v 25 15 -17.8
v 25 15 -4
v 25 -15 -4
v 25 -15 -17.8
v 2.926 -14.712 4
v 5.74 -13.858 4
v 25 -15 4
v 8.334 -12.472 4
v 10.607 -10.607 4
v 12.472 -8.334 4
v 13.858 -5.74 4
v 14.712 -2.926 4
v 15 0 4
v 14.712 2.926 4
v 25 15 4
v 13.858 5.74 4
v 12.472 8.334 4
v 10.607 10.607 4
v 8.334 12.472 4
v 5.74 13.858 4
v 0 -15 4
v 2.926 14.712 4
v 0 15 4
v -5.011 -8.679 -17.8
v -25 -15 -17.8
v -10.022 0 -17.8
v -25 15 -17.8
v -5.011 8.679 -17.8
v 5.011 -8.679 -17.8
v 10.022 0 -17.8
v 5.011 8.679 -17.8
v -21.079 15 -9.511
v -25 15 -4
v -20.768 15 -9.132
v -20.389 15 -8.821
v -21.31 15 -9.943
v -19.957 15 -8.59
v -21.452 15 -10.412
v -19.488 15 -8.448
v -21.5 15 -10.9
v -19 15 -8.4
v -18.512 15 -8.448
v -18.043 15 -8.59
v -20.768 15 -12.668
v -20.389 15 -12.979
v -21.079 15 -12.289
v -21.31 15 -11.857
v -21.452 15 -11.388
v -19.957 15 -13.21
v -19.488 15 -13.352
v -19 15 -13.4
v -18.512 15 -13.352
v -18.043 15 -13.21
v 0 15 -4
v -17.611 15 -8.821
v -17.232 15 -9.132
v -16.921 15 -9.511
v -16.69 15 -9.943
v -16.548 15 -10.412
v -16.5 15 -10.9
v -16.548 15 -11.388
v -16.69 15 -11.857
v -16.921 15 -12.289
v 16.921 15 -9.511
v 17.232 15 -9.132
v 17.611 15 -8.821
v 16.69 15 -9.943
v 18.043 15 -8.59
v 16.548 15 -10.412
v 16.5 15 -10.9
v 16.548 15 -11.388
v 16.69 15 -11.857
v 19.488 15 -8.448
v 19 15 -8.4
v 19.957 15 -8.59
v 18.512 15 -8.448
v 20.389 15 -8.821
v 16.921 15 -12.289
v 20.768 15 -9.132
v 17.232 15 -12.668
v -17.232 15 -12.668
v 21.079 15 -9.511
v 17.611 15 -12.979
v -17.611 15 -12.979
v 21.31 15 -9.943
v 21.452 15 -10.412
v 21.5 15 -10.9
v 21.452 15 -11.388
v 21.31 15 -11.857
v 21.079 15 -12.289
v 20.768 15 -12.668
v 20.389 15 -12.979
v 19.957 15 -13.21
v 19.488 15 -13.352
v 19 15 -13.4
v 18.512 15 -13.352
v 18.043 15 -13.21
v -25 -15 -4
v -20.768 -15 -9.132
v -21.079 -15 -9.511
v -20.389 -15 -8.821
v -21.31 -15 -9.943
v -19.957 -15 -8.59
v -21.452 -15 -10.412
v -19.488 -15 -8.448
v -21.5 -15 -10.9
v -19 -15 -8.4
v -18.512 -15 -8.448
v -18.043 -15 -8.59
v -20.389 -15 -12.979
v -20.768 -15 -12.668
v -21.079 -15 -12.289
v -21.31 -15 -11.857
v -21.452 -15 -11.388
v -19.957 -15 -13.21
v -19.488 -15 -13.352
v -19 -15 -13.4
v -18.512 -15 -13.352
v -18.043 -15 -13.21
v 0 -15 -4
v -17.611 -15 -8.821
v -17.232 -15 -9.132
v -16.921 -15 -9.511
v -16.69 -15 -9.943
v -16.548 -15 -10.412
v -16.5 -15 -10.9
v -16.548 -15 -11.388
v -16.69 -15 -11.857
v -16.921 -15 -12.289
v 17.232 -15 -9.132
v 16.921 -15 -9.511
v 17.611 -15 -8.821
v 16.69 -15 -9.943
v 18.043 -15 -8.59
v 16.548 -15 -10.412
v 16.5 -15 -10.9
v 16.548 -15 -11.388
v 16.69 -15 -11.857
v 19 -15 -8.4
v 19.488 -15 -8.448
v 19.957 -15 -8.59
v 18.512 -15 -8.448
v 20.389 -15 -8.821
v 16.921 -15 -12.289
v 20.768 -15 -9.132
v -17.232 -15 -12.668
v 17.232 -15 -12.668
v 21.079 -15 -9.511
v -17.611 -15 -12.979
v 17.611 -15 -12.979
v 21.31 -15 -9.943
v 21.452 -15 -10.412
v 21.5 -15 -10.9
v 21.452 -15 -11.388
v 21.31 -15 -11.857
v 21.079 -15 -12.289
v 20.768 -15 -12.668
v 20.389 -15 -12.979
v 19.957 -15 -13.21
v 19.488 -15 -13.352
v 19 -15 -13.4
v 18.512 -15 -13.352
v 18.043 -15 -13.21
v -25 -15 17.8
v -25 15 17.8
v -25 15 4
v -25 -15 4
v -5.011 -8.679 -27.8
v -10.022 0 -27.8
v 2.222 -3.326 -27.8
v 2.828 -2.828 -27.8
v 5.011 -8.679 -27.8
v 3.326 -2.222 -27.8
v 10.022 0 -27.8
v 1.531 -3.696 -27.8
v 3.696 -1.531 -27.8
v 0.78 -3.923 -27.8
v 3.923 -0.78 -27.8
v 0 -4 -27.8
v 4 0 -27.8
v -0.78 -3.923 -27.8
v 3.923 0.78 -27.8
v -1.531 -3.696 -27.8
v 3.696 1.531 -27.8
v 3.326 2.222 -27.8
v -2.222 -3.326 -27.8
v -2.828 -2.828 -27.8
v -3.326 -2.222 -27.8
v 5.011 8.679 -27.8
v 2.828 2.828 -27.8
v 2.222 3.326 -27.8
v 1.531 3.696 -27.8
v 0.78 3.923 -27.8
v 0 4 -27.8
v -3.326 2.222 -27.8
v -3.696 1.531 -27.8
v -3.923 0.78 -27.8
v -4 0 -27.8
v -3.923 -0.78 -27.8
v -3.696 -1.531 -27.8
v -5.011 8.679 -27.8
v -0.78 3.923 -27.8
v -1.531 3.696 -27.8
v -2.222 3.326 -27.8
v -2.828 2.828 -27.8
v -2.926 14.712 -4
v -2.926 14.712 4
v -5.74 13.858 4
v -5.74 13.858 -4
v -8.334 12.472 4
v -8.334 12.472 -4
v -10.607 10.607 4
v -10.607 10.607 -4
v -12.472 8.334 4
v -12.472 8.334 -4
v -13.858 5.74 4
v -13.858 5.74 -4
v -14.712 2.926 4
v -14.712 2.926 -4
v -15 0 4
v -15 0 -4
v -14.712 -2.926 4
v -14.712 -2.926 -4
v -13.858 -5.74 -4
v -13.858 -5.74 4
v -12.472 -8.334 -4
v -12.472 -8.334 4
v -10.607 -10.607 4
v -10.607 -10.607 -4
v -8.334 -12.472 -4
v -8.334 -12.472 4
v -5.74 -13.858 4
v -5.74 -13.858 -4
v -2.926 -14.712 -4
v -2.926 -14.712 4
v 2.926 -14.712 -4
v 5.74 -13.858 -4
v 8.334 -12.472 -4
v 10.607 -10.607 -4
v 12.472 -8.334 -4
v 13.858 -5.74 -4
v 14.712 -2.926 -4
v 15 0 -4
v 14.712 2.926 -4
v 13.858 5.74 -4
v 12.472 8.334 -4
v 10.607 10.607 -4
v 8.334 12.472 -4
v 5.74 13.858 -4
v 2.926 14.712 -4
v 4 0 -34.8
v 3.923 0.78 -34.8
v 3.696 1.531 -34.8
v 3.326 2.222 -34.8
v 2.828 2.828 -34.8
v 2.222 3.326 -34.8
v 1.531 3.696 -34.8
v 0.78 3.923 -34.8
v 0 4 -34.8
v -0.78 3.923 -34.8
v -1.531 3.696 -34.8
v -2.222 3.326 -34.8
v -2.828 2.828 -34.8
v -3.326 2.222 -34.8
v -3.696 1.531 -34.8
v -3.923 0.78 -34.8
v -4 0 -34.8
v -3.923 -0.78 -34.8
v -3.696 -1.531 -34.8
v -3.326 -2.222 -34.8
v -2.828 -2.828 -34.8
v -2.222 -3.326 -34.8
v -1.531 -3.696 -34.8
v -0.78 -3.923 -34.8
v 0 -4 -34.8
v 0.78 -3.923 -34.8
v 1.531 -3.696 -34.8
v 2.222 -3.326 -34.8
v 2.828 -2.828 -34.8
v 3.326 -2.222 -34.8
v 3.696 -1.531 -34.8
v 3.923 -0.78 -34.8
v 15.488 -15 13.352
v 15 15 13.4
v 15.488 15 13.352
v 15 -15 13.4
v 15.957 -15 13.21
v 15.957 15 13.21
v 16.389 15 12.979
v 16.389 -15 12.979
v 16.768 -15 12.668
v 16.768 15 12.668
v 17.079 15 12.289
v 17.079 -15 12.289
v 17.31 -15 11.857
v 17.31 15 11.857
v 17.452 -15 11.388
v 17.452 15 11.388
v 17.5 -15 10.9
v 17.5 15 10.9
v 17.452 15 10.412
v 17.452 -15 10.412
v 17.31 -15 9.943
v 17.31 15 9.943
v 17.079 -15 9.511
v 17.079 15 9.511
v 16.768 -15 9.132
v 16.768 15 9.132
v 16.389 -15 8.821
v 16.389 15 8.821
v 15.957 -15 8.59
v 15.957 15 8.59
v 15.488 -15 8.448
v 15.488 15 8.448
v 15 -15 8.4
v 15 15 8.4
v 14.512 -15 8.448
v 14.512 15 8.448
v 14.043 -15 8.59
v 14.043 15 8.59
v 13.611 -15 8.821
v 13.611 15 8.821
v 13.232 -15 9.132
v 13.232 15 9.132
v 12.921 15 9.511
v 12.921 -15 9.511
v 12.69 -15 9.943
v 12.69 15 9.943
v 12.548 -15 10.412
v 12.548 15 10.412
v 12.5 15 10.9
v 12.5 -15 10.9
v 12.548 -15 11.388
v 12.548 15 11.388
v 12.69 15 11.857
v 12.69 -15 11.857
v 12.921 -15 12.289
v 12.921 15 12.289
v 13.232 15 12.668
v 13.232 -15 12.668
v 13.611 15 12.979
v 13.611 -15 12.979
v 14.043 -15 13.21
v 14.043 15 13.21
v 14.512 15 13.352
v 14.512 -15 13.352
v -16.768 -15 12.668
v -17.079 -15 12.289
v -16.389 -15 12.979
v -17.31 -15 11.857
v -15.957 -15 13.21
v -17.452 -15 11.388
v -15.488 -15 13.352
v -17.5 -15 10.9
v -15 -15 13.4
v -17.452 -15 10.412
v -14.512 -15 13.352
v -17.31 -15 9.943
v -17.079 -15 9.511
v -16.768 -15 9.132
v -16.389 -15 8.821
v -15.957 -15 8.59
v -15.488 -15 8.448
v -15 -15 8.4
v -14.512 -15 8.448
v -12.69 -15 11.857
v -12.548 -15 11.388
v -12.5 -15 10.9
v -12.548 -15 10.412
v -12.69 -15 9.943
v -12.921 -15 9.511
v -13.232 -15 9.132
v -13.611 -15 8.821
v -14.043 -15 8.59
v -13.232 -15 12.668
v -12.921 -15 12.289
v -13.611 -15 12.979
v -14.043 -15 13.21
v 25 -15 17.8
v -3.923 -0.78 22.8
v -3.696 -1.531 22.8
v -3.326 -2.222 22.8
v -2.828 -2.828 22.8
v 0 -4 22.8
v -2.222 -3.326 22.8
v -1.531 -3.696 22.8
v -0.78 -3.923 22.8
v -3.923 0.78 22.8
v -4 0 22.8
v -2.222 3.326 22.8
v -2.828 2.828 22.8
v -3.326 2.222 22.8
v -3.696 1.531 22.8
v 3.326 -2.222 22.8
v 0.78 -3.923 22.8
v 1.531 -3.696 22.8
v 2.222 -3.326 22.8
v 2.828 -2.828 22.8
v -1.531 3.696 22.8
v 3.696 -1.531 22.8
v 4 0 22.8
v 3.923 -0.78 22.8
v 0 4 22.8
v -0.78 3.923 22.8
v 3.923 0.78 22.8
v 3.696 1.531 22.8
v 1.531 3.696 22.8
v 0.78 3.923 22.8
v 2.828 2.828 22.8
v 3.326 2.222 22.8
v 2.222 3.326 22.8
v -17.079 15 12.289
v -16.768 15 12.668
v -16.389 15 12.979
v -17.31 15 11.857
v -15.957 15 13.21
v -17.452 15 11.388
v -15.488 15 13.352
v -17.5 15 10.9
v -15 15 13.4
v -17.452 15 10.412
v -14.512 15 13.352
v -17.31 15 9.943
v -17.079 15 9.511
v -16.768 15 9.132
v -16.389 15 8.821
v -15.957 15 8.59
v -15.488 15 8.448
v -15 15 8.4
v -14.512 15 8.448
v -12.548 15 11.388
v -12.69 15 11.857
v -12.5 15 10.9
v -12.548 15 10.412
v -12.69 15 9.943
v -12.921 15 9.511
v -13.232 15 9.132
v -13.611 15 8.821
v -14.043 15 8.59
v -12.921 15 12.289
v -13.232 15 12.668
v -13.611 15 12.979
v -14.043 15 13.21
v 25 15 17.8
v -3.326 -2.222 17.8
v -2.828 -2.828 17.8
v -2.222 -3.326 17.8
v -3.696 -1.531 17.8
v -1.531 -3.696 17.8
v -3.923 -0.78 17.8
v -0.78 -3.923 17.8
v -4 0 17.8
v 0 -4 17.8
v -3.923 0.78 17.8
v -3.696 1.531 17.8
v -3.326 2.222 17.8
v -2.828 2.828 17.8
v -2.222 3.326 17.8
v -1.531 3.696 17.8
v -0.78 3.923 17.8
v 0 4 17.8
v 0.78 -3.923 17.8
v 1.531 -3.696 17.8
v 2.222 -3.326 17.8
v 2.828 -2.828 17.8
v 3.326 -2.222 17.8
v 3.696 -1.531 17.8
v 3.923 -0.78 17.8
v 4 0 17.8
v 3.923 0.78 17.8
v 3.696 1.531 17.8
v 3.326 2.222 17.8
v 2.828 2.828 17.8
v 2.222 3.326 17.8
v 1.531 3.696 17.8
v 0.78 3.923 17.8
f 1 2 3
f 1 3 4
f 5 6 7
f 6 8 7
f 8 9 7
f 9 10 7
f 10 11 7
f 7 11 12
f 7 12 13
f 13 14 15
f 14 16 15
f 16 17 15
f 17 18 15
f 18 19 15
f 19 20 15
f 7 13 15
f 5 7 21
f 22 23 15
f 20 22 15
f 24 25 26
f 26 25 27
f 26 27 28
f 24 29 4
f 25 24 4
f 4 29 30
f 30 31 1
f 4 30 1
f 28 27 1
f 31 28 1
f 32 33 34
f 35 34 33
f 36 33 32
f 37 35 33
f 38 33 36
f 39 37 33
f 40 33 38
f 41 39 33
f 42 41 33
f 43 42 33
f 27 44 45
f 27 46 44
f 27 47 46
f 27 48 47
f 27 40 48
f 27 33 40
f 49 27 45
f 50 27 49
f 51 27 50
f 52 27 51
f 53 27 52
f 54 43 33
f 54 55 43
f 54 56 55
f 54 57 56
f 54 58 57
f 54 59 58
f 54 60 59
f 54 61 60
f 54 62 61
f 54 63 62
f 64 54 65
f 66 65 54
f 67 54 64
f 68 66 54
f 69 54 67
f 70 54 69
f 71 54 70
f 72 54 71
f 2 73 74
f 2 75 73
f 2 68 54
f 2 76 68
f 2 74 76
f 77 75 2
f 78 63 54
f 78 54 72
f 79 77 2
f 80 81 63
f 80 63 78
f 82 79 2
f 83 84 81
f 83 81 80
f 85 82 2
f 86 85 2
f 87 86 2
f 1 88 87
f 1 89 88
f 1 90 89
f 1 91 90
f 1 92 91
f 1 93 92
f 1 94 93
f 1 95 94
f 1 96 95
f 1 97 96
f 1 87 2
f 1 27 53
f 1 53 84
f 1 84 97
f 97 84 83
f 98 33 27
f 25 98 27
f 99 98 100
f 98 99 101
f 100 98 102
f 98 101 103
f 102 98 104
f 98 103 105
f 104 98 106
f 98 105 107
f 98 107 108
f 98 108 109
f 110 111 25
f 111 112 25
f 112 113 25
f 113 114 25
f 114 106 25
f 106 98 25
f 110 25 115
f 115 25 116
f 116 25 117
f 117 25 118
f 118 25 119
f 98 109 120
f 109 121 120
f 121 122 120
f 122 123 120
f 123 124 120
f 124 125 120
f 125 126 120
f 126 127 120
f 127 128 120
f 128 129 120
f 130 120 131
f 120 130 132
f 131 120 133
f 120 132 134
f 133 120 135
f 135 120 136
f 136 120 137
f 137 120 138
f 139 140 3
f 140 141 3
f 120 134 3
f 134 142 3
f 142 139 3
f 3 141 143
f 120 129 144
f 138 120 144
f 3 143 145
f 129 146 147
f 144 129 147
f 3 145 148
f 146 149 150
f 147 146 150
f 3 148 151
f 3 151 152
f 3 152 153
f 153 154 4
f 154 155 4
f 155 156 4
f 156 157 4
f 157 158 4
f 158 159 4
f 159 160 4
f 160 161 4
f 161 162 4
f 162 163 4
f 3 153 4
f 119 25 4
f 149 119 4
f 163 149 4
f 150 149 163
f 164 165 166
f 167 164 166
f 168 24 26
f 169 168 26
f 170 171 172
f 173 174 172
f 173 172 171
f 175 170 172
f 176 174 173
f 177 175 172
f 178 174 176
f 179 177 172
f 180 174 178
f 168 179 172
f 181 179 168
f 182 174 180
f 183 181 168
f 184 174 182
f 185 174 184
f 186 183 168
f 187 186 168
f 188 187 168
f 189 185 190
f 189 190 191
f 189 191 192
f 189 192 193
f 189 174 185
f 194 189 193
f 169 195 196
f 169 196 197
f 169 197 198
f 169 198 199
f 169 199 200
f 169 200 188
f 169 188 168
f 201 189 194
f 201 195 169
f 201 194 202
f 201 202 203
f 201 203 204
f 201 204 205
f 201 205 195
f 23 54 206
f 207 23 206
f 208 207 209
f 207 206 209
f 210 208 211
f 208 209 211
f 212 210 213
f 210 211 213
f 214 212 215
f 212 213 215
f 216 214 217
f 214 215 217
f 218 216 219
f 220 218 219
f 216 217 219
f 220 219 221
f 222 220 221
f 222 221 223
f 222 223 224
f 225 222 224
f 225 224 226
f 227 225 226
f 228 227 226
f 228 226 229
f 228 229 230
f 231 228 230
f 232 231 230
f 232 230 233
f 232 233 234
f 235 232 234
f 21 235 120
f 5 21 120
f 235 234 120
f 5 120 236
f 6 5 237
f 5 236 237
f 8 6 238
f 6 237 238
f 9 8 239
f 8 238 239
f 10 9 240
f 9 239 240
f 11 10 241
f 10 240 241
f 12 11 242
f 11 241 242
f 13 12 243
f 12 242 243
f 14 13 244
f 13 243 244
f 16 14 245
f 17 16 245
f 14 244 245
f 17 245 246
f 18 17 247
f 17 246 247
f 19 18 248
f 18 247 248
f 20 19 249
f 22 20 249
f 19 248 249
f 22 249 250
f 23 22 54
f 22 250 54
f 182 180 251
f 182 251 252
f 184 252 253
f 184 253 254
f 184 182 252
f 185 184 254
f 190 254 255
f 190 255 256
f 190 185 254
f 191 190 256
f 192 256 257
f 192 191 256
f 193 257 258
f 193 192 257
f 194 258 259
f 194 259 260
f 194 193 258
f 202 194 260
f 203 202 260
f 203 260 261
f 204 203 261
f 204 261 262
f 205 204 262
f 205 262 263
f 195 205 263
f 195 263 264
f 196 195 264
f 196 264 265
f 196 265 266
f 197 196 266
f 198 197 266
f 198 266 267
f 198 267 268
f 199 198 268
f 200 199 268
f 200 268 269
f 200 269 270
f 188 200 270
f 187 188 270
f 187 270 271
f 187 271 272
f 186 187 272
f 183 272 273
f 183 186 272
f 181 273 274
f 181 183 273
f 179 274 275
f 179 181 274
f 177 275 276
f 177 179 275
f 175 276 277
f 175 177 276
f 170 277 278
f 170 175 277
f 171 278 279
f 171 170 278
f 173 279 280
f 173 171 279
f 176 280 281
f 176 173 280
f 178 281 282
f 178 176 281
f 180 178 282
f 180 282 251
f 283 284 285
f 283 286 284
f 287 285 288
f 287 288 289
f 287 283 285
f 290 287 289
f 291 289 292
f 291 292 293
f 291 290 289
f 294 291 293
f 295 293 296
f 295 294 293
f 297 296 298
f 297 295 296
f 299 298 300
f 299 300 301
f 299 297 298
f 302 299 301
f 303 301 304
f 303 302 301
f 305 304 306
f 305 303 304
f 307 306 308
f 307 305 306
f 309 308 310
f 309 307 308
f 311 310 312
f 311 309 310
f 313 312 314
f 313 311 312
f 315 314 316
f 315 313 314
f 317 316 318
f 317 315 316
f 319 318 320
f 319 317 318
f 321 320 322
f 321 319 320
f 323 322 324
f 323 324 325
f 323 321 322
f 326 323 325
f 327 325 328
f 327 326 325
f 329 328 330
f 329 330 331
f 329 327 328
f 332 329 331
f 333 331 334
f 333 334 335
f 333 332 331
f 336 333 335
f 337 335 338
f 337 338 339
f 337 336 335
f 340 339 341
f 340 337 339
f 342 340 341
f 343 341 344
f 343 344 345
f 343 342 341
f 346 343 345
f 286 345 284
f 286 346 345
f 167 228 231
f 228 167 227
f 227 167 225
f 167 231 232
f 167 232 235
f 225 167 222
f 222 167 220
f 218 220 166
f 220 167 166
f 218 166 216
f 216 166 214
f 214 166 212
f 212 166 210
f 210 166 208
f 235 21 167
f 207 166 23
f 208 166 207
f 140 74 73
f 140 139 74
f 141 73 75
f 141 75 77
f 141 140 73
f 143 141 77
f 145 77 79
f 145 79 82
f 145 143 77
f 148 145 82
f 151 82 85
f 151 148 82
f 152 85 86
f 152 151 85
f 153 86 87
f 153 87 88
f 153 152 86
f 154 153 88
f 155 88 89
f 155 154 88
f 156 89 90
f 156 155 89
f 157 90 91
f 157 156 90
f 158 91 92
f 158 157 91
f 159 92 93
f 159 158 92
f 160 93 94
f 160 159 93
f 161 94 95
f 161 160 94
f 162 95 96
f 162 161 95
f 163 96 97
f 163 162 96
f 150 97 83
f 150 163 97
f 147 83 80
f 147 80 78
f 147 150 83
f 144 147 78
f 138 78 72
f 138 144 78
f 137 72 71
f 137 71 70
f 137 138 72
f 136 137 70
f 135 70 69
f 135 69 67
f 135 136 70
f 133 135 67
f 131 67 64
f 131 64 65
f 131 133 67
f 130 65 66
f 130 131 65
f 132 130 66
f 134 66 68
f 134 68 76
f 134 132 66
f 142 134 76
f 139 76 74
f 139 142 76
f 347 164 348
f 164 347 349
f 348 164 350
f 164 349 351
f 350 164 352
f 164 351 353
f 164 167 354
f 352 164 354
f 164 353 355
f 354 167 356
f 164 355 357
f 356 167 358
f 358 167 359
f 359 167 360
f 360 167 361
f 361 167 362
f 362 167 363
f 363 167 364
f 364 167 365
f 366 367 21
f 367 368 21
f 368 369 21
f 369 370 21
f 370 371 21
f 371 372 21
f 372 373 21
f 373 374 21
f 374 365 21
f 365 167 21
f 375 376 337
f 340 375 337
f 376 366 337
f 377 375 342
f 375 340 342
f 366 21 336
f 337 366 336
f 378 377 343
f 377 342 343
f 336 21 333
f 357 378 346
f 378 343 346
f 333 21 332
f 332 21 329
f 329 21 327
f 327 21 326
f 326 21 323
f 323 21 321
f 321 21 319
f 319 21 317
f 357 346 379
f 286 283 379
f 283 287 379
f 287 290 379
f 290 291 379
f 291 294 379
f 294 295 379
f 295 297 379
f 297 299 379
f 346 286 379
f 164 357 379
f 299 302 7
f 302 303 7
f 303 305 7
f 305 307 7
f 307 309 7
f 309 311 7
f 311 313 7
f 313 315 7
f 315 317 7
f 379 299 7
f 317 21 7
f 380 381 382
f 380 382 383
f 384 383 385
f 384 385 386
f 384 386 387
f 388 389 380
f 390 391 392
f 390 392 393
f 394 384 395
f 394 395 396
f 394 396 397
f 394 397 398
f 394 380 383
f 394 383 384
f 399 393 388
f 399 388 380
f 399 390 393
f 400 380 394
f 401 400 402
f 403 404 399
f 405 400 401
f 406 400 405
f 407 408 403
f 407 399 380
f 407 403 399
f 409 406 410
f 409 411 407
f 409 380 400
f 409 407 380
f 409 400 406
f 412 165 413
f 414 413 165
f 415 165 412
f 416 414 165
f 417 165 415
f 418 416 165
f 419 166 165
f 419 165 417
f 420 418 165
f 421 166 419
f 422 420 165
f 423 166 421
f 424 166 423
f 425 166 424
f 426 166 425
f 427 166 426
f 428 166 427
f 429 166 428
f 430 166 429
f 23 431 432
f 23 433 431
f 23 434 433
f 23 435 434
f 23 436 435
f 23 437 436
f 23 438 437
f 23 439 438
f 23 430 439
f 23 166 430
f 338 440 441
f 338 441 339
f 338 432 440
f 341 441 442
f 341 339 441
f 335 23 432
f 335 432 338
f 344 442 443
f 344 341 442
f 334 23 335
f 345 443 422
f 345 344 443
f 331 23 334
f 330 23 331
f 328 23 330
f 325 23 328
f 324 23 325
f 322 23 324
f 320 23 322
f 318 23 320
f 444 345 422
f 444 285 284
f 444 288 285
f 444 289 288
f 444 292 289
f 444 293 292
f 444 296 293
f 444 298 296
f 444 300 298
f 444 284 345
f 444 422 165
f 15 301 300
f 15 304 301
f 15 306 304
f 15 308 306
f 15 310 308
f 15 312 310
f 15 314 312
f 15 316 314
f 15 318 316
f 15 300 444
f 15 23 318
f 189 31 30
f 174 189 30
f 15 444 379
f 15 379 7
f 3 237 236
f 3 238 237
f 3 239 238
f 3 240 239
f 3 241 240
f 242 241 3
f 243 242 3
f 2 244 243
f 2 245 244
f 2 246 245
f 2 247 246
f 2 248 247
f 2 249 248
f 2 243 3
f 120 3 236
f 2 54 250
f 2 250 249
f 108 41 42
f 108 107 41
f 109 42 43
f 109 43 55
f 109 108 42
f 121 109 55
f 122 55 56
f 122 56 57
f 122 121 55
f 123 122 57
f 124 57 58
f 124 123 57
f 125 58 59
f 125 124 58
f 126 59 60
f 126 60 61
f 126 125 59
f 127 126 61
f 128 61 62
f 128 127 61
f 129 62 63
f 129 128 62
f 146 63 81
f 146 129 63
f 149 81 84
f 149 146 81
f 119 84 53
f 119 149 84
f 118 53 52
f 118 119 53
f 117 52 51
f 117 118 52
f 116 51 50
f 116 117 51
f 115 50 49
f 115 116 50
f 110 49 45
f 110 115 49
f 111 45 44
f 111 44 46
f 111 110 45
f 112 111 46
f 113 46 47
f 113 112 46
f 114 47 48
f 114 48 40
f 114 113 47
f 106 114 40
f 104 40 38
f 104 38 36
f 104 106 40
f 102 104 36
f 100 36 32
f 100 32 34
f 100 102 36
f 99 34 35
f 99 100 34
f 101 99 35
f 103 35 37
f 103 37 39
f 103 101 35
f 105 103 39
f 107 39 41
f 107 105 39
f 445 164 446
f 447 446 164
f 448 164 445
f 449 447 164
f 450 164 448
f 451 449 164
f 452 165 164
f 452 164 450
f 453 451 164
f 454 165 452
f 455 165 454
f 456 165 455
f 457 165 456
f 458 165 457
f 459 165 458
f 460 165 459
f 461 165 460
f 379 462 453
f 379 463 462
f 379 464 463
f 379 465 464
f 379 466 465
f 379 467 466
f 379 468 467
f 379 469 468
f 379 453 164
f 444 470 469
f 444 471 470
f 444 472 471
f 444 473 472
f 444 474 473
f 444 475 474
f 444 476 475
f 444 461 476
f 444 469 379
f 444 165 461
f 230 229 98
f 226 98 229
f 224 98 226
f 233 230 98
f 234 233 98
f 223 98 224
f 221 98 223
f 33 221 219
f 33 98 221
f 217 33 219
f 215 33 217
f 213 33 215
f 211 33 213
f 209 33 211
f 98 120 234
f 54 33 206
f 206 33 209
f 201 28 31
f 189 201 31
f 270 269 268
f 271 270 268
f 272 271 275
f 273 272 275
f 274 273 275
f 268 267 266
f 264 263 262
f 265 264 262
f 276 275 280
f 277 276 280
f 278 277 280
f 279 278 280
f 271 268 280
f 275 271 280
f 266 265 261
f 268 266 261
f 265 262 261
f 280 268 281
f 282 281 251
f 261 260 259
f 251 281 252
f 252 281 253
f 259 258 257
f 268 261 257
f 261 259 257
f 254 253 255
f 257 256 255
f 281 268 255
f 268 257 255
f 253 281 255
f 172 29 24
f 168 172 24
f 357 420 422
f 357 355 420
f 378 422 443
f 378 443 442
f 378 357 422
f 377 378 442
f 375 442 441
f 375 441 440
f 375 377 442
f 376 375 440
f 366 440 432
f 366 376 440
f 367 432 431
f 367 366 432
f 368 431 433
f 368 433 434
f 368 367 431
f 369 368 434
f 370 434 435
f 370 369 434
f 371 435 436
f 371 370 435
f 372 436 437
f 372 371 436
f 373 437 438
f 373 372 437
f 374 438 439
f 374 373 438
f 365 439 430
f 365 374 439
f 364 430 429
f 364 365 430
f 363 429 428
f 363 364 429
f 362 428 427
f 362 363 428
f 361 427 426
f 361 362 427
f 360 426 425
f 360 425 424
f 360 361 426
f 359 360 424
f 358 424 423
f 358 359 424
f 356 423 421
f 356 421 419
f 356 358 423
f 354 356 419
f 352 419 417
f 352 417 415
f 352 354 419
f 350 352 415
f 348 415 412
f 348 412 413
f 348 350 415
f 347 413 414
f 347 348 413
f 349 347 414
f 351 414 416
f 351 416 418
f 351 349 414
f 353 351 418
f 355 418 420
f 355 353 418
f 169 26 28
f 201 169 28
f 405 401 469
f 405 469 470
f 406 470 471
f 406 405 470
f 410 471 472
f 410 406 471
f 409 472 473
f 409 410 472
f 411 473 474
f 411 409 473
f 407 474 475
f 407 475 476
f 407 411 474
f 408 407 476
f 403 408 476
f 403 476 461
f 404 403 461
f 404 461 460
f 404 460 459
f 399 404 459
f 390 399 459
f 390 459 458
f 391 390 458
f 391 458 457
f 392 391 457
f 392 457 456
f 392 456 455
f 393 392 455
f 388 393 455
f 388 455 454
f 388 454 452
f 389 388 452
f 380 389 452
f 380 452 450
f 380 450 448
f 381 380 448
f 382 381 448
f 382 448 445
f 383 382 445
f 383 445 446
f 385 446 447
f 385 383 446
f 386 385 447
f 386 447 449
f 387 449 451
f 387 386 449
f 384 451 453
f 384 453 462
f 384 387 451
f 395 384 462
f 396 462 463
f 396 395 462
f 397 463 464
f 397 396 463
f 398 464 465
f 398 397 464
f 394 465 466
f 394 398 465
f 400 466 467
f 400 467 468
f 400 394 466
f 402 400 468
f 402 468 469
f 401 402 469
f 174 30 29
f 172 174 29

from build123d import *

# Parameters (mm, degrees)
SKETCH_1_W        = 50
SKETCH_1_H        = 13.8
SKETCH_1_R        = 2.5
EXTRUDE_1_DEPTH   = 15
EXTRUDE_1_2_DEPTH = 15
EXTRUDE_START     = -4
SKETCH_2_R        = 15
EXTRUDE_2_DEPTH   = 8
SKETCH_3_R        = 4
EXTRUDE_3_DEPTH   = 57.6
EXTRUDE_4_DEPTH   = 10


with BuildPart() as part:
    # 草图1 → 凸台-拉伸1 (new, symmetric)
    with BuildSketch(Plane(origin=(0, 0, 0), x_dir=(1, 0, 0), z_dir=(0, 1, 0))):
        with Locations((0, 10.9)):
            Rectangle(SKETCH_1_W, SKETCH_1_H)
        with Locations(Location((-19, 10.9, 0), (0, 0, 270))):
            Circle(SKETCH_1_R, mode=Mode.SUBTRACT)
        with Locations(Location((19, 10.9, 0), (0, 0, 270))):
            Circle(SKETCH_1_R, mode=Mode.SUBTRACT)
    extrude(amount=EXTRUDE_1_DEPTH, both=True)



with BuildPart() as body_2:
    # 草图1 → Extrude 1 2 (new, symmetric)
    with BuildSketch(Plane(origin=(0, 0, 0), x_dir=(1, 0, 0), z_dir=(0, 1, 0))):
        with Locations((0, -10.9)):
            Rectangle(SKETCH_1_W, SKETCH_1_H)
        with Locations(Location((15, -10.9, 0), (0, 0, 270))):
            Circle(SKETCH_1_R, mode=Mode.SUBTRACT)
        with Locations(Location((-15, -10.9, 0), (0, 0, 270))):
            Circle(SKETCH_1_R, mode=Mode.SUBTRACT)
    extrude(amount=EXTRUDE_1_2_DEPTH, both=True)


with BuildPart() as part_1:
    add(part.part)

    add(body_2.part)  # 凸台-拉伸2 merges body 2
    # 草图2 → 凸台-拉伸2 (add)
    with BuildSketch(Plane.XY.offset(EXTRUDE_START)):
        with Locations(Location((0, 0, 0), (0, 0, 90))):
            Circle(SKETCH_2_R)
    extrude(amount=EXTRUDE_2_DEPTH)

    # 草图3 → 凸台-拉伸3 (add)
    with BuildSketch(Plane.XY.offset(22.8)):
        Circle(SKETCH_3_R)
    extrude(amount=-EXTRUDE_3_DEPTH)

    # 草图4 → 凸台-拉伸4 (add)
    with BuildSketch(Plane(origin=(0, 0, -17.8), x_dir=(-1, 0, 0), z_dir=(0, 0, -1))):
        Polygon((-10.021943358, 0), (-5.010971679, -8.679257543), (5.010971679, -8.679257543), (10.021943358, 0), (5.010971679, 8.679257543), (-5.010971679, 8.679257543), align=None)
    extrude(amount=EXTRUDE_4_DEPTH)


solid = part_1.part
